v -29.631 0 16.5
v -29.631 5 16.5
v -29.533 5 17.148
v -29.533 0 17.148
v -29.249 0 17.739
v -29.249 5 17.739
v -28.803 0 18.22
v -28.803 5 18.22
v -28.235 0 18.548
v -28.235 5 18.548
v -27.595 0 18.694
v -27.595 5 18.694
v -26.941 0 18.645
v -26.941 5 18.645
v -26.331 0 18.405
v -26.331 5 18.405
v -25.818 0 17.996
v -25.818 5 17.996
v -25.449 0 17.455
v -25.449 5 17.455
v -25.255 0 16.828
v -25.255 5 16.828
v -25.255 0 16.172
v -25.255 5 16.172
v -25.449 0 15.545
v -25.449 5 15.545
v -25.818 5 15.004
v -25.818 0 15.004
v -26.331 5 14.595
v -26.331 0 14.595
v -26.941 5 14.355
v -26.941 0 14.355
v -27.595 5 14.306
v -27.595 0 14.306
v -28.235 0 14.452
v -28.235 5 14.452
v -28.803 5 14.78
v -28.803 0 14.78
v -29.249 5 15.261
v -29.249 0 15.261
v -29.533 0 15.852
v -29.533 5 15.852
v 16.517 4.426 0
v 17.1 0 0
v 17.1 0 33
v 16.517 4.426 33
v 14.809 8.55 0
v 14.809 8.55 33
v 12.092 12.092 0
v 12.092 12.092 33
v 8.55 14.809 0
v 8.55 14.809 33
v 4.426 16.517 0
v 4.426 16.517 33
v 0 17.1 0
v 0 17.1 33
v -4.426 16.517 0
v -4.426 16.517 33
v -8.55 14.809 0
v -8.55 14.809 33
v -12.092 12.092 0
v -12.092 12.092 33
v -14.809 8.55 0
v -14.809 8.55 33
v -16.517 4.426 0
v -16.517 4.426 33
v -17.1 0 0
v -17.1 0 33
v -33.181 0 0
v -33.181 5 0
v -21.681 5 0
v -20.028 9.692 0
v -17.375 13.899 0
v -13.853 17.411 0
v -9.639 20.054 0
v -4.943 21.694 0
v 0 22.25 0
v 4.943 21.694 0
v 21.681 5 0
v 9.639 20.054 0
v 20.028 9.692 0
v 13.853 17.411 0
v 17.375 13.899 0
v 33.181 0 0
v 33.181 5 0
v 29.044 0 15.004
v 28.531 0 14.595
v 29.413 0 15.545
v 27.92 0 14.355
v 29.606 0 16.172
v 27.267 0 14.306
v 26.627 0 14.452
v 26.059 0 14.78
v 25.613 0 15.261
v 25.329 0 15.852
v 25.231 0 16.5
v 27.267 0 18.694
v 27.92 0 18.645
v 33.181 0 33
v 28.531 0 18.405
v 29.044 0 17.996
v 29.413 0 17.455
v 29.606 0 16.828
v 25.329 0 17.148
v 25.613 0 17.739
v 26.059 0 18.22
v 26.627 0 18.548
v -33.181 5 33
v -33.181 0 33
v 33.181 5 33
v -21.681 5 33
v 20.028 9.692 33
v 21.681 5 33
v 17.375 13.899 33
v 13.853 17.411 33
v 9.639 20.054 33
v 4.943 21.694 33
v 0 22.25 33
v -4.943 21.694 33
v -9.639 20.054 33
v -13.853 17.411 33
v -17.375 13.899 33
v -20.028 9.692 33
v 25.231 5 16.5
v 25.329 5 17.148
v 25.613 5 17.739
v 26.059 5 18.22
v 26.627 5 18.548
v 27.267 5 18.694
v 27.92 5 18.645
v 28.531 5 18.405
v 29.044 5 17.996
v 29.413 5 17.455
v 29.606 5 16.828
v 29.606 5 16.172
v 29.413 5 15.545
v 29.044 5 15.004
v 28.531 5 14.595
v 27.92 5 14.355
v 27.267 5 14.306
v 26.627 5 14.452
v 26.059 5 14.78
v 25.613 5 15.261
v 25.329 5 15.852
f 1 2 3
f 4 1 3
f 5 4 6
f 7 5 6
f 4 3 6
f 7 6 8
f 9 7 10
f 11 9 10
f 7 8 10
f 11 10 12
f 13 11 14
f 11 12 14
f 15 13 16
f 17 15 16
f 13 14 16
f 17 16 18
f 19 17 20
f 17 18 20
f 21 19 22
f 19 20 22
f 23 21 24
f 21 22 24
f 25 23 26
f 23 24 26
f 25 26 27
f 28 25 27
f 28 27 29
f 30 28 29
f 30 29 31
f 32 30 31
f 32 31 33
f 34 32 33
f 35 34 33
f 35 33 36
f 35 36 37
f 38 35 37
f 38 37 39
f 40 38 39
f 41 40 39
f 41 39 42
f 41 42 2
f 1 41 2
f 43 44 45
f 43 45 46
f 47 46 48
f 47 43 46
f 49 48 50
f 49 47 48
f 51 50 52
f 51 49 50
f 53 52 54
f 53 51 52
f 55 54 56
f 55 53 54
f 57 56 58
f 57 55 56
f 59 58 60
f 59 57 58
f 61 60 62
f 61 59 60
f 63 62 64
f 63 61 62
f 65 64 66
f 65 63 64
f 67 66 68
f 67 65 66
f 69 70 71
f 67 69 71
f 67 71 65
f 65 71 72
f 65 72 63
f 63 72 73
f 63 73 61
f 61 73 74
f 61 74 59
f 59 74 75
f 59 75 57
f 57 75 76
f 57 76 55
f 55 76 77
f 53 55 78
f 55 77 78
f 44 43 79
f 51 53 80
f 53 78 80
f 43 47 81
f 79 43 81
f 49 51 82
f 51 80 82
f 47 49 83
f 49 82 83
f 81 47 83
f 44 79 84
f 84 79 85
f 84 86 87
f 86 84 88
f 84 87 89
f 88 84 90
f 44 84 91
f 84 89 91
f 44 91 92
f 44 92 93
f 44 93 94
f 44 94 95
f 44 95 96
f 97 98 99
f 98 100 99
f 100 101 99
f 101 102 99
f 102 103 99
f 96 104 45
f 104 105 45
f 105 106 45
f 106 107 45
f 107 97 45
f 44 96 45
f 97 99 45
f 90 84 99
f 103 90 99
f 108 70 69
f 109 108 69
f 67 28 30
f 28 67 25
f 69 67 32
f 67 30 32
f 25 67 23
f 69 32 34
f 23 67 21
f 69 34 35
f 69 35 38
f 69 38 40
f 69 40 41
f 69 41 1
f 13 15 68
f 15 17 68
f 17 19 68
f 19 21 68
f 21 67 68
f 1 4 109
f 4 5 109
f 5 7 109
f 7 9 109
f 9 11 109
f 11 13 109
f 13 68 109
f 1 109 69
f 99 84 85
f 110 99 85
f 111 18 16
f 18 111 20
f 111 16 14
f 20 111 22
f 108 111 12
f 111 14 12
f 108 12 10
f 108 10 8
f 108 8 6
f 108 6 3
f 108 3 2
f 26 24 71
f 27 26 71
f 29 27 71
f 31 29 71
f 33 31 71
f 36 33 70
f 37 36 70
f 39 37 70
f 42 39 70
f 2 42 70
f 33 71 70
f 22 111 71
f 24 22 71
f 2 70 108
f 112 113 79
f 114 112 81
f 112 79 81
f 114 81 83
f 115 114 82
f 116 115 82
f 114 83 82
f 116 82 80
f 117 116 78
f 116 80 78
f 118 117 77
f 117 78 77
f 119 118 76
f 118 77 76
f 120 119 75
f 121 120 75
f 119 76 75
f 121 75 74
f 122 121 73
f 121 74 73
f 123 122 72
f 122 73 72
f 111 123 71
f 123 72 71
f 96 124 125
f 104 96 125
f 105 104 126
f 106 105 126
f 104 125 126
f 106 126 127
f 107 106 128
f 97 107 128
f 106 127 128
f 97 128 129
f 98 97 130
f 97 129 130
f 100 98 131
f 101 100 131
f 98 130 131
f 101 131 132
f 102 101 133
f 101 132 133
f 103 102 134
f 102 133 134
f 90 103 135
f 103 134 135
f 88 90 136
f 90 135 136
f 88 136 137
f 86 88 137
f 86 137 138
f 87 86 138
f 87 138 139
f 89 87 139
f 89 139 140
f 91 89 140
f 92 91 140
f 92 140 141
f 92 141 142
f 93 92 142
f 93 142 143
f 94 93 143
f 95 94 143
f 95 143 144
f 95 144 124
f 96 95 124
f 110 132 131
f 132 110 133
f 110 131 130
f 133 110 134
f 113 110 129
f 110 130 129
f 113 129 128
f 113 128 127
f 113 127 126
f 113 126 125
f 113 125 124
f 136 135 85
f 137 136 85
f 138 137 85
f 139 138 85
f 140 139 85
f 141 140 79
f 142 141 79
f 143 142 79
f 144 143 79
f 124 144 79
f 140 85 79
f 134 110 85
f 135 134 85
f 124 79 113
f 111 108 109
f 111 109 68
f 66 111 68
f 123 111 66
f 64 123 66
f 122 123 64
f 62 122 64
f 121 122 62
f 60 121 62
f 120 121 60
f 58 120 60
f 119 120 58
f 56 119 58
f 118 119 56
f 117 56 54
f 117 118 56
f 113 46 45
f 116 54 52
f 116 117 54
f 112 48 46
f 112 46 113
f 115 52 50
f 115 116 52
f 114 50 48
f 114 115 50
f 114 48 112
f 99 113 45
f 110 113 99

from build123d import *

# Parameters (mm, degrees)
F0_R     = 17.1
F1_DEPTH = 33
F3_D     = 4.4
F5_D     = 4.4
F7_DEPTH = 33


with BuildPart() as f1:
    # F0 (on Top) → F1 (new body)
    with BuildSketch(Plane.XY):
        with BuildLine():
            ThreePointArc((-21.6809247958, -5), (-22.25, 0), (-21.6809247958, 5))
            Line((-21.6809247958, 5), (-33.1809247958, 5))
            Line((-33.1809247958, 5), (-33.1809247958, -5))
            Line((-33.1809247958, -5), (-21.6809247958, -5))
        make_face()
        with BuildLine():
            ThreePointArc((21.6809247958, -5), (22.1072734265, -2.516140228), (22.25, 0))
            ThreePointArc((22.25, 0), (22.1072734265, 2.516140228), (21.6809247958, 5))
            ThreePointArc((21.6809247958, 5), (0, 22.25), (-21.6809247958, 5))
            ThreePointArc((-21.6809247958, 5), (-22.25, 0), (-21.6809247958, -5))
            ThreePointArc((-21.6809247958, -5), (0, -22.25), (21.6809247958, -5))
        make_face()
        Circle(F0_R, mode=Mode.SUBTRACT)
        with BuildLine():
            ThreePointArc((21.6809247958, 5), (22.1072734265, 2.516140228), (22.25, 0))
            ThreePointArc((22.25, 0), (22.1072734265, -2.516140228), (21.6809247958, -5))
            Line((21.6809247958, -5), (33.1809247958, -5))
            Line((33.1809247958, -5), (33.1809247958, 5))
            Line((33.1809247958, 5), (21.6809247958, 5))
        make_face()
    extrude(amount=F1_DEPTH)

    # F3 (through all)
    with Locations(Plane.XZ.offset(5)):
        with Locations((-27.4309247958, 16.5)):
            Hole(F3_D / 2)

    # F5 (through all)
    with Locations(Plane.XZ.offset(5)):
        with Locations((27.4309247958, 16.5)):
            Hole(F5_D / 2)

    # F6 (on face) → F7 (cut)
    with BuildSketch(Plane.XY.offset(33)):
        with BuildLine():
            Line((33.1809247958, 0), (17.1, 0))
            ThreePointArc((17.1, 0), (0, -17.1), (-17.1, 0))
            Line((-17.1, 0), (-33.1809247958, 0))
            Line((-33.1809247958, 0), (-33.1809247958, -5))
            Line((-33.1809247958, -5), (-21.6809247958, -5))
            ThreePointArc((-21.6809247958, -5), (0, -22.25), (21.6809247958, -5))
            Line((21.6809247958, -5), (33.1809247958, -5))
            Line((33.1809247958, -5), (33.1809247958, 0))
        make_face()
        with BuildLine():
            Line((33.1809247958, -22.675672546), (33.1809247958, -5))
            Line((33.1809247958, -5), (21.6809247958, -5))
            ThreePointArc((21.6809247958, -5), (0, -22.25), (-21.6809247958, -5))
            Line((-21.6809247958, -5), (-33.1809247958, -5))
            Line((-33.1809247958, -5), (-33.1809247958, -22.675672546))
            Line((-33.1809247958, -22.675672546), (33.1809247958, -22.675672546))
        make_face()
        with BuildLine():
            ThreePointArc((-17.1, 0), (0, -17.1), (17.1, 0))
            Line((17.1, 0), (-17.1, 0))
        make_face()
    extrude(amount=-F7_DEPTH, mode=Mode.SUBTRACT)


solid = f1.part
